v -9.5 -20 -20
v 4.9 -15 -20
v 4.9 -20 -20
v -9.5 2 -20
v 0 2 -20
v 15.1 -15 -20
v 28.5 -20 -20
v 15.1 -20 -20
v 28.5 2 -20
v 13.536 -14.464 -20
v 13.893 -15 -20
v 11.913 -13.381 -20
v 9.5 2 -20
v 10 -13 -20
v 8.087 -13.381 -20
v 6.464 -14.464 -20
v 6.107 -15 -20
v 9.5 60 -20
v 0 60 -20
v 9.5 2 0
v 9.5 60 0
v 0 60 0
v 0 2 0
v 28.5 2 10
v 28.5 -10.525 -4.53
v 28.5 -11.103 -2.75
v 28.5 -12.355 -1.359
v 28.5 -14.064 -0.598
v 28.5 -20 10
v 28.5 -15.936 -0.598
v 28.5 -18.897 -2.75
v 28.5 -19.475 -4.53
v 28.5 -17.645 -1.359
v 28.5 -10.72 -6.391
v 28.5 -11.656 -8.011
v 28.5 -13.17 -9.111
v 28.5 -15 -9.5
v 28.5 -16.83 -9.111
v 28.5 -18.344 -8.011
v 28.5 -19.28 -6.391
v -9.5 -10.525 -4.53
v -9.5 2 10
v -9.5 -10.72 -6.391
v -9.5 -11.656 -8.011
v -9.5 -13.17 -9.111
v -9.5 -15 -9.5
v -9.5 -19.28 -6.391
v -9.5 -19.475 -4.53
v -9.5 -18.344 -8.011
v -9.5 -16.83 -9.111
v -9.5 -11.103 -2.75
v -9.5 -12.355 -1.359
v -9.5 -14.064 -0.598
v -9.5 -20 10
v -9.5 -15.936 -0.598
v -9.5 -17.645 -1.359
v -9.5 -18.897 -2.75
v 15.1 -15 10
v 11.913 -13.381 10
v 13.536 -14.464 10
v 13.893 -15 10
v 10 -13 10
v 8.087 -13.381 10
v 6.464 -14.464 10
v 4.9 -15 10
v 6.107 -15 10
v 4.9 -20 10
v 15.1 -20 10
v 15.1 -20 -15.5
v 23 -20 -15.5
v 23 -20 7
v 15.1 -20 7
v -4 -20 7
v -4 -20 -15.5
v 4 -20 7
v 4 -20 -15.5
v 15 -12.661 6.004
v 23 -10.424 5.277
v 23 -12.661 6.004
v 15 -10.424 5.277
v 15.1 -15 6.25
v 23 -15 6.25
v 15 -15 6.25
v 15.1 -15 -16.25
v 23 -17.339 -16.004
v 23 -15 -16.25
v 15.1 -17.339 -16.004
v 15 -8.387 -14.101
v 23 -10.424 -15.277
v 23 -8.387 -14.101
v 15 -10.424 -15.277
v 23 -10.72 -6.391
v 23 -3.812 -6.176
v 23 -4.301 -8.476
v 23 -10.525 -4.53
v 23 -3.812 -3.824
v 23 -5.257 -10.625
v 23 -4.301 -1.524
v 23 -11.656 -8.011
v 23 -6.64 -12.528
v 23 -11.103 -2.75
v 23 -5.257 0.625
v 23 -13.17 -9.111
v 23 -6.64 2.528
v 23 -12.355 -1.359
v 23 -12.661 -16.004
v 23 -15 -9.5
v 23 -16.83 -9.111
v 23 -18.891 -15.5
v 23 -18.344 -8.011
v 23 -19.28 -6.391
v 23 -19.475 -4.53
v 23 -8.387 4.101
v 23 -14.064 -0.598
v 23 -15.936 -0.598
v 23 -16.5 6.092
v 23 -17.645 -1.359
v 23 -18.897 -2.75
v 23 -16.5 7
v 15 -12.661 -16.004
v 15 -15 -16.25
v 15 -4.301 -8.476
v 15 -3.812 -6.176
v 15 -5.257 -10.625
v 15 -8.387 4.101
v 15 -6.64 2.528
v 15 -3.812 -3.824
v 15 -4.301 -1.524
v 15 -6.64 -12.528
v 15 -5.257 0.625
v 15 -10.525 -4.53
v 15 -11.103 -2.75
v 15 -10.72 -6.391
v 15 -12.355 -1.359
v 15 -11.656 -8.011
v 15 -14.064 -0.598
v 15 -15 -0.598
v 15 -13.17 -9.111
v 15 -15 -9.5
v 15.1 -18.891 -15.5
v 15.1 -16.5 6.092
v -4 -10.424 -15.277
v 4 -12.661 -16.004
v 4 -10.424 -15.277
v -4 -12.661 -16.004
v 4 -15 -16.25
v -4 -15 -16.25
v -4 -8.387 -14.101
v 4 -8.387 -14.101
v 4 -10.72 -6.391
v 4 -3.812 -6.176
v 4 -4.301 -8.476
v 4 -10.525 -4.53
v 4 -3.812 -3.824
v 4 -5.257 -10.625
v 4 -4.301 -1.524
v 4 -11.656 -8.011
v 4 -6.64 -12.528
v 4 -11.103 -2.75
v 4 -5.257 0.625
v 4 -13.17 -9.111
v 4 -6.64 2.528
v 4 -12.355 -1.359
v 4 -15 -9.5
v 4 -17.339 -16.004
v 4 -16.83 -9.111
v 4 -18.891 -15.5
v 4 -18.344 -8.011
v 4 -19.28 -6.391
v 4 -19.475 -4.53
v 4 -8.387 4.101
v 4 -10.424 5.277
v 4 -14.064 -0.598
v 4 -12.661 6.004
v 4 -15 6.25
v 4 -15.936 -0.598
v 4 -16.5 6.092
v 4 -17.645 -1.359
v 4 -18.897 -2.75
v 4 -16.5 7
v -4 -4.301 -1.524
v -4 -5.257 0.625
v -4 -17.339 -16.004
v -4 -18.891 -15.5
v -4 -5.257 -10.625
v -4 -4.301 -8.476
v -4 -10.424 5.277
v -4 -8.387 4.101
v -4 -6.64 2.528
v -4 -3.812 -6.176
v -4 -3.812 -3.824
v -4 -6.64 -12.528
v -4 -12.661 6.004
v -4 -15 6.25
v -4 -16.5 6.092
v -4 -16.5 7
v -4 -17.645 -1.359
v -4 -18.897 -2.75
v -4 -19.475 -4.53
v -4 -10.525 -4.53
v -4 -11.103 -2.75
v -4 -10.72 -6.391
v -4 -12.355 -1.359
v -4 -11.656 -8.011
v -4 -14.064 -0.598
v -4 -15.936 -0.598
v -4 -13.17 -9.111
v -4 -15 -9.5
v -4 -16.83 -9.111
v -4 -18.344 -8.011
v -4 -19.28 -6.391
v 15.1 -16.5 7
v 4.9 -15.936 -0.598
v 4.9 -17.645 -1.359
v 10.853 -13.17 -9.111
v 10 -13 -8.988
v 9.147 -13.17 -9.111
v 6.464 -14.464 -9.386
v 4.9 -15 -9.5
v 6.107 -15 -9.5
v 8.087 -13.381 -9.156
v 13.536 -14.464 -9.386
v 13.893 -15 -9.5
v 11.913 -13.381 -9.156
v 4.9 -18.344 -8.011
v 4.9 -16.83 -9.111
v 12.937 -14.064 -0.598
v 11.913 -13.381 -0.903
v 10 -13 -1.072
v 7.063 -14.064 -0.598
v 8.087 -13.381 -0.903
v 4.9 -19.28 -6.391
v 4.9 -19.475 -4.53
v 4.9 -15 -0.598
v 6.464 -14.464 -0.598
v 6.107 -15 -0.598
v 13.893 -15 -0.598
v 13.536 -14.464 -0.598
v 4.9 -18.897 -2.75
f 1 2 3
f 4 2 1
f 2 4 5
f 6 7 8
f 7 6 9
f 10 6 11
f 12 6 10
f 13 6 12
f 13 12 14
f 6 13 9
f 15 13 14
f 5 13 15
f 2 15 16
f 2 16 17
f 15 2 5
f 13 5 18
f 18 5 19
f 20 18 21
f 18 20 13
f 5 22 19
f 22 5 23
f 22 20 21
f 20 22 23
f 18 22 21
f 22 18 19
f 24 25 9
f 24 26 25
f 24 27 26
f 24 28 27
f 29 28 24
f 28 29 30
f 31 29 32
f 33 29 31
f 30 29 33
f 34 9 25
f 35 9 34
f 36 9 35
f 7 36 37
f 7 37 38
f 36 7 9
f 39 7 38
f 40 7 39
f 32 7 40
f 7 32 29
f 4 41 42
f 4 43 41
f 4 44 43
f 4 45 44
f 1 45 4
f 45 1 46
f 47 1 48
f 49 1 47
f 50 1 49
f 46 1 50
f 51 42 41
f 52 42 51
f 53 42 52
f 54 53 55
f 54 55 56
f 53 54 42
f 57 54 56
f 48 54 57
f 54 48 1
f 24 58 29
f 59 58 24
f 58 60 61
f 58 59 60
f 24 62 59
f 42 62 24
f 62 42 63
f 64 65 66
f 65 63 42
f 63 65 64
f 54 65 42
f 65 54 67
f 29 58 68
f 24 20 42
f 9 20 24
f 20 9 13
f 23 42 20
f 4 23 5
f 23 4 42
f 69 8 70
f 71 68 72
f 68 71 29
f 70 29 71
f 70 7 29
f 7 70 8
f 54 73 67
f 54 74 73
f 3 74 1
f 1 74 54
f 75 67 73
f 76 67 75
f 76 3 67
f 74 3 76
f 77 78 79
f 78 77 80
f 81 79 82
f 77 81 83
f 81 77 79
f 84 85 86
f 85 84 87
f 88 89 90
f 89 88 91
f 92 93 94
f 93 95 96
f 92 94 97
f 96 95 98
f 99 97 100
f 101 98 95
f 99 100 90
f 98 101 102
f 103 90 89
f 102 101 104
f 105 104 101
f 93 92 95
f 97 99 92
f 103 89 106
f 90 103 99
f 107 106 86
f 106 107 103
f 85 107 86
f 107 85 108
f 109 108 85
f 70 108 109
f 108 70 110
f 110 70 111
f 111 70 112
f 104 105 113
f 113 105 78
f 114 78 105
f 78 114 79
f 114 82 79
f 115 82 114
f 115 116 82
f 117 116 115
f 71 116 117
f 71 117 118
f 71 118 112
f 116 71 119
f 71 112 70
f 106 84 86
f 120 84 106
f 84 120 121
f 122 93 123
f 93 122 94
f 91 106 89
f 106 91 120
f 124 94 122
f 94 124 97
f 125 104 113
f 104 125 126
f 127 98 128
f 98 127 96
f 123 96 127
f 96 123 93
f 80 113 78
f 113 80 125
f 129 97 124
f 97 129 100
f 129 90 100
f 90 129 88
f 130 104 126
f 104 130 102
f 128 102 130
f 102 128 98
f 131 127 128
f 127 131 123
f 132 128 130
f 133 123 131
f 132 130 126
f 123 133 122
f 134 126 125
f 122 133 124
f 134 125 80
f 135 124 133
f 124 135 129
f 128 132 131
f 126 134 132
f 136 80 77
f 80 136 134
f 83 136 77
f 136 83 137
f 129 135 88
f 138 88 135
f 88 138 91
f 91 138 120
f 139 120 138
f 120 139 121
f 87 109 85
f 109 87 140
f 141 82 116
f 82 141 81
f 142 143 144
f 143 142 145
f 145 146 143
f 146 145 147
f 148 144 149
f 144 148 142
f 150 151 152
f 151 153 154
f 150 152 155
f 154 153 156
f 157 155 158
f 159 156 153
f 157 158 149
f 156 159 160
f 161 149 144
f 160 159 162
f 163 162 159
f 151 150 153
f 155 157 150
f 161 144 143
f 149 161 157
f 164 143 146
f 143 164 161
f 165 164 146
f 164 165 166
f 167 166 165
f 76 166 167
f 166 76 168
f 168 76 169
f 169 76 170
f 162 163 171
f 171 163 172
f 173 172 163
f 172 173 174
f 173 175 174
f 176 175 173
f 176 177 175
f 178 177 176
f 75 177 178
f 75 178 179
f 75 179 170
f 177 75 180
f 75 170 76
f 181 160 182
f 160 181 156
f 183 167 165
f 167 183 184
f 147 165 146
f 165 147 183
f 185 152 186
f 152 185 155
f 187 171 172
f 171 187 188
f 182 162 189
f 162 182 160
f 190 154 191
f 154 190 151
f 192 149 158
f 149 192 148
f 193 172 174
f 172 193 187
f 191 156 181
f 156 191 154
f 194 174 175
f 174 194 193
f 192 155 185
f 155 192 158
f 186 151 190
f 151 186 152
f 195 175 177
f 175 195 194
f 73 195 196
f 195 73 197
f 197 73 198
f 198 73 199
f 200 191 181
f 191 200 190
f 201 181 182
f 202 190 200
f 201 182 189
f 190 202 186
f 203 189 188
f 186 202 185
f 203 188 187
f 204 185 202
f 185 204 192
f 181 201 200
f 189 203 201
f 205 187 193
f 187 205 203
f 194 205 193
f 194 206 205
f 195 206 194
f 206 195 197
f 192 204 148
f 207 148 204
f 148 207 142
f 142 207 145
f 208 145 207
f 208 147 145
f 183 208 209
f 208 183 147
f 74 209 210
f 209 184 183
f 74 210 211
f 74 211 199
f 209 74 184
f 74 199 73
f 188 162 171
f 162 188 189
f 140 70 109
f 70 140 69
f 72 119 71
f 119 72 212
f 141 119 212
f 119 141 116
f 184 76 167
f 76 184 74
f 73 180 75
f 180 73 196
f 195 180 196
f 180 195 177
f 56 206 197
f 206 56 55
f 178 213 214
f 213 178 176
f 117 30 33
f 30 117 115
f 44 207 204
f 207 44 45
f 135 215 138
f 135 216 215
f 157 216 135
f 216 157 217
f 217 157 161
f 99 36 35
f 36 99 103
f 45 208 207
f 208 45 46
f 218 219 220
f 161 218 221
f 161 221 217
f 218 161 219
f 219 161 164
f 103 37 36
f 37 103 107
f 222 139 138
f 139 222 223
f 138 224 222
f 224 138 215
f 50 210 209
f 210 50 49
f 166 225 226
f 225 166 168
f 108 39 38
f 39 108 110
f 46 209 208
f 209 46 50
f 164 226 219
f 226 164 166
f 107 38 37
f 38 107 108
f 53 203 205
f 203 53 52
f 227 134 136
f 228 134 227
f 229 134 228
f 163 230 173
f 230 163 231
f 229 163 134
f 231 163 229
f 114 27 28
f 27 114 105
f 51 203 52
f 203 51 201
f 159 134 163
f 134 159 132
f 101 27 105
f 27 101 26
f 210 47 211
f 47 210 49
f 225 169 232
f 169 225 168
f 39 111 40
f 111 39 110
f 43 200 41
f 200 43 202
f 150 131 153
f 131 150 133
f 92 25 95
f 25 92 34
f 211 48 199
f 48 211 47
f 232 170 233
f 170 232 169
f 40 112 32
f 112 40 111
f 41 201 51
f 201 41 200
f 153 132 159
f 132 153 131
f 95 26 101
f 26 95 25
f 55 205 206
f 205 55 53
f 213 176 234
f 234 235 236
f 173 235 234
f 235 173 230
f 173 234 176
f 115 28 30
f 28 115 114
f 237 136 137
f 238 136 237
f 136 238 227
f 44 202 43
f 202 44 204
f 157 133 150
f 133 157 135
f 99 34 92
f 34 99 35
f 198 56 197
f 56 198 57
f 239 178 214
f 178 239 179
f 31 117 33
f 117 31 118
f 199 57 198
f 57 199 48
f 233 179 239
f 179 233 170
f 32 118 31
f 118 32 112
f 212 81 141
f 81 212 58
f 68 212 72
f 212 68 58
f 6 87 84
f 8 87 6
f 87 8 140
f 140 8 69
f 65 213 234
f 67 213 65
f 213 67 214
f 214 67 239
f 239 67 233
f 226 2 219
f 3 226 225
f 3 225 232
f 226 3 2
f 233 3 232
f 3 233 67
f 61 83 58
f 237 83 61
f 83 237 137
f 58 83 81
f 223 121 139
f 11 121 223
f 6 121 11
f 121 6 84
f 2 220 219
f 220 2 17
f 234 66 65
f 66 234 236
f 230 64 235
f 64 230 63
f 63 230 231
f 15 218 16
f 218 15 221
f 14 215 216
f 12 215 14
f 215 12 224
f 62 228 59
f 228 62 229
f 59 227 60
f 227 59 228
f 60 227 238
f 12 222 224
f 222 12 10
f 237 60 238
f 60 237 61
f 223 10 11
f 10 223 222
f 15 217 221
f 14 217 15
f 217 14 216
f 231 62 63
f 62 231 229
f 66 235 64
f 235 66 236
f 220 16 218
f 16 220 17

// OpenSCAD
// size of tool_post_shank: [width, depth, height]
tool_post_shank = [20,60,9.5];

bearing_diameter = 22.5;
bearing_height = 8;

bolt_diameter = 9;
bolt_height = 40;

tool_diameter = 10;



module lathe_tool(){
	difference(){
		union(){

			// tool post shank
			cube(tool_post_shank);

			// bearing block
			translate([-tool_post_shank[0]/2,-tool_post_shank[1]/3,-tool_post_shank[2]]){
				 cube([30,22,38]);
			}

		}

		// bearing cutouts
		translate([5,-bearing_diameter/1.5,15]) cylinder(h=bearing_height,r=bearing_diameter/2);
		translate([5,-bearing_diameter/1.5,-4]) cylinder(h=bearing_height,r=bearing_diameter/2);
		translate([-7,-39,15]) cube([bearing_diameter,bearing_diameter,bearing_height]);
		translate([-7,-39,-4]) cube([bearing_diameter,bearing_diameter,bearing_height]);

		// bolt cutout
		translate([5,-bearing_diameter/1.5,-10]) cylinder(h=bolt_height,r=bolt_diameter/2);
		translate([-15,-26,4.9]) cube([40,11,10.2]);
		translate([-15,-18,10]) rotate([0,90,0]) cylinder(h=40,r=tool_diameter/2);
	}
}



rotate([0,90,0]){
	lathe_tool();
}
